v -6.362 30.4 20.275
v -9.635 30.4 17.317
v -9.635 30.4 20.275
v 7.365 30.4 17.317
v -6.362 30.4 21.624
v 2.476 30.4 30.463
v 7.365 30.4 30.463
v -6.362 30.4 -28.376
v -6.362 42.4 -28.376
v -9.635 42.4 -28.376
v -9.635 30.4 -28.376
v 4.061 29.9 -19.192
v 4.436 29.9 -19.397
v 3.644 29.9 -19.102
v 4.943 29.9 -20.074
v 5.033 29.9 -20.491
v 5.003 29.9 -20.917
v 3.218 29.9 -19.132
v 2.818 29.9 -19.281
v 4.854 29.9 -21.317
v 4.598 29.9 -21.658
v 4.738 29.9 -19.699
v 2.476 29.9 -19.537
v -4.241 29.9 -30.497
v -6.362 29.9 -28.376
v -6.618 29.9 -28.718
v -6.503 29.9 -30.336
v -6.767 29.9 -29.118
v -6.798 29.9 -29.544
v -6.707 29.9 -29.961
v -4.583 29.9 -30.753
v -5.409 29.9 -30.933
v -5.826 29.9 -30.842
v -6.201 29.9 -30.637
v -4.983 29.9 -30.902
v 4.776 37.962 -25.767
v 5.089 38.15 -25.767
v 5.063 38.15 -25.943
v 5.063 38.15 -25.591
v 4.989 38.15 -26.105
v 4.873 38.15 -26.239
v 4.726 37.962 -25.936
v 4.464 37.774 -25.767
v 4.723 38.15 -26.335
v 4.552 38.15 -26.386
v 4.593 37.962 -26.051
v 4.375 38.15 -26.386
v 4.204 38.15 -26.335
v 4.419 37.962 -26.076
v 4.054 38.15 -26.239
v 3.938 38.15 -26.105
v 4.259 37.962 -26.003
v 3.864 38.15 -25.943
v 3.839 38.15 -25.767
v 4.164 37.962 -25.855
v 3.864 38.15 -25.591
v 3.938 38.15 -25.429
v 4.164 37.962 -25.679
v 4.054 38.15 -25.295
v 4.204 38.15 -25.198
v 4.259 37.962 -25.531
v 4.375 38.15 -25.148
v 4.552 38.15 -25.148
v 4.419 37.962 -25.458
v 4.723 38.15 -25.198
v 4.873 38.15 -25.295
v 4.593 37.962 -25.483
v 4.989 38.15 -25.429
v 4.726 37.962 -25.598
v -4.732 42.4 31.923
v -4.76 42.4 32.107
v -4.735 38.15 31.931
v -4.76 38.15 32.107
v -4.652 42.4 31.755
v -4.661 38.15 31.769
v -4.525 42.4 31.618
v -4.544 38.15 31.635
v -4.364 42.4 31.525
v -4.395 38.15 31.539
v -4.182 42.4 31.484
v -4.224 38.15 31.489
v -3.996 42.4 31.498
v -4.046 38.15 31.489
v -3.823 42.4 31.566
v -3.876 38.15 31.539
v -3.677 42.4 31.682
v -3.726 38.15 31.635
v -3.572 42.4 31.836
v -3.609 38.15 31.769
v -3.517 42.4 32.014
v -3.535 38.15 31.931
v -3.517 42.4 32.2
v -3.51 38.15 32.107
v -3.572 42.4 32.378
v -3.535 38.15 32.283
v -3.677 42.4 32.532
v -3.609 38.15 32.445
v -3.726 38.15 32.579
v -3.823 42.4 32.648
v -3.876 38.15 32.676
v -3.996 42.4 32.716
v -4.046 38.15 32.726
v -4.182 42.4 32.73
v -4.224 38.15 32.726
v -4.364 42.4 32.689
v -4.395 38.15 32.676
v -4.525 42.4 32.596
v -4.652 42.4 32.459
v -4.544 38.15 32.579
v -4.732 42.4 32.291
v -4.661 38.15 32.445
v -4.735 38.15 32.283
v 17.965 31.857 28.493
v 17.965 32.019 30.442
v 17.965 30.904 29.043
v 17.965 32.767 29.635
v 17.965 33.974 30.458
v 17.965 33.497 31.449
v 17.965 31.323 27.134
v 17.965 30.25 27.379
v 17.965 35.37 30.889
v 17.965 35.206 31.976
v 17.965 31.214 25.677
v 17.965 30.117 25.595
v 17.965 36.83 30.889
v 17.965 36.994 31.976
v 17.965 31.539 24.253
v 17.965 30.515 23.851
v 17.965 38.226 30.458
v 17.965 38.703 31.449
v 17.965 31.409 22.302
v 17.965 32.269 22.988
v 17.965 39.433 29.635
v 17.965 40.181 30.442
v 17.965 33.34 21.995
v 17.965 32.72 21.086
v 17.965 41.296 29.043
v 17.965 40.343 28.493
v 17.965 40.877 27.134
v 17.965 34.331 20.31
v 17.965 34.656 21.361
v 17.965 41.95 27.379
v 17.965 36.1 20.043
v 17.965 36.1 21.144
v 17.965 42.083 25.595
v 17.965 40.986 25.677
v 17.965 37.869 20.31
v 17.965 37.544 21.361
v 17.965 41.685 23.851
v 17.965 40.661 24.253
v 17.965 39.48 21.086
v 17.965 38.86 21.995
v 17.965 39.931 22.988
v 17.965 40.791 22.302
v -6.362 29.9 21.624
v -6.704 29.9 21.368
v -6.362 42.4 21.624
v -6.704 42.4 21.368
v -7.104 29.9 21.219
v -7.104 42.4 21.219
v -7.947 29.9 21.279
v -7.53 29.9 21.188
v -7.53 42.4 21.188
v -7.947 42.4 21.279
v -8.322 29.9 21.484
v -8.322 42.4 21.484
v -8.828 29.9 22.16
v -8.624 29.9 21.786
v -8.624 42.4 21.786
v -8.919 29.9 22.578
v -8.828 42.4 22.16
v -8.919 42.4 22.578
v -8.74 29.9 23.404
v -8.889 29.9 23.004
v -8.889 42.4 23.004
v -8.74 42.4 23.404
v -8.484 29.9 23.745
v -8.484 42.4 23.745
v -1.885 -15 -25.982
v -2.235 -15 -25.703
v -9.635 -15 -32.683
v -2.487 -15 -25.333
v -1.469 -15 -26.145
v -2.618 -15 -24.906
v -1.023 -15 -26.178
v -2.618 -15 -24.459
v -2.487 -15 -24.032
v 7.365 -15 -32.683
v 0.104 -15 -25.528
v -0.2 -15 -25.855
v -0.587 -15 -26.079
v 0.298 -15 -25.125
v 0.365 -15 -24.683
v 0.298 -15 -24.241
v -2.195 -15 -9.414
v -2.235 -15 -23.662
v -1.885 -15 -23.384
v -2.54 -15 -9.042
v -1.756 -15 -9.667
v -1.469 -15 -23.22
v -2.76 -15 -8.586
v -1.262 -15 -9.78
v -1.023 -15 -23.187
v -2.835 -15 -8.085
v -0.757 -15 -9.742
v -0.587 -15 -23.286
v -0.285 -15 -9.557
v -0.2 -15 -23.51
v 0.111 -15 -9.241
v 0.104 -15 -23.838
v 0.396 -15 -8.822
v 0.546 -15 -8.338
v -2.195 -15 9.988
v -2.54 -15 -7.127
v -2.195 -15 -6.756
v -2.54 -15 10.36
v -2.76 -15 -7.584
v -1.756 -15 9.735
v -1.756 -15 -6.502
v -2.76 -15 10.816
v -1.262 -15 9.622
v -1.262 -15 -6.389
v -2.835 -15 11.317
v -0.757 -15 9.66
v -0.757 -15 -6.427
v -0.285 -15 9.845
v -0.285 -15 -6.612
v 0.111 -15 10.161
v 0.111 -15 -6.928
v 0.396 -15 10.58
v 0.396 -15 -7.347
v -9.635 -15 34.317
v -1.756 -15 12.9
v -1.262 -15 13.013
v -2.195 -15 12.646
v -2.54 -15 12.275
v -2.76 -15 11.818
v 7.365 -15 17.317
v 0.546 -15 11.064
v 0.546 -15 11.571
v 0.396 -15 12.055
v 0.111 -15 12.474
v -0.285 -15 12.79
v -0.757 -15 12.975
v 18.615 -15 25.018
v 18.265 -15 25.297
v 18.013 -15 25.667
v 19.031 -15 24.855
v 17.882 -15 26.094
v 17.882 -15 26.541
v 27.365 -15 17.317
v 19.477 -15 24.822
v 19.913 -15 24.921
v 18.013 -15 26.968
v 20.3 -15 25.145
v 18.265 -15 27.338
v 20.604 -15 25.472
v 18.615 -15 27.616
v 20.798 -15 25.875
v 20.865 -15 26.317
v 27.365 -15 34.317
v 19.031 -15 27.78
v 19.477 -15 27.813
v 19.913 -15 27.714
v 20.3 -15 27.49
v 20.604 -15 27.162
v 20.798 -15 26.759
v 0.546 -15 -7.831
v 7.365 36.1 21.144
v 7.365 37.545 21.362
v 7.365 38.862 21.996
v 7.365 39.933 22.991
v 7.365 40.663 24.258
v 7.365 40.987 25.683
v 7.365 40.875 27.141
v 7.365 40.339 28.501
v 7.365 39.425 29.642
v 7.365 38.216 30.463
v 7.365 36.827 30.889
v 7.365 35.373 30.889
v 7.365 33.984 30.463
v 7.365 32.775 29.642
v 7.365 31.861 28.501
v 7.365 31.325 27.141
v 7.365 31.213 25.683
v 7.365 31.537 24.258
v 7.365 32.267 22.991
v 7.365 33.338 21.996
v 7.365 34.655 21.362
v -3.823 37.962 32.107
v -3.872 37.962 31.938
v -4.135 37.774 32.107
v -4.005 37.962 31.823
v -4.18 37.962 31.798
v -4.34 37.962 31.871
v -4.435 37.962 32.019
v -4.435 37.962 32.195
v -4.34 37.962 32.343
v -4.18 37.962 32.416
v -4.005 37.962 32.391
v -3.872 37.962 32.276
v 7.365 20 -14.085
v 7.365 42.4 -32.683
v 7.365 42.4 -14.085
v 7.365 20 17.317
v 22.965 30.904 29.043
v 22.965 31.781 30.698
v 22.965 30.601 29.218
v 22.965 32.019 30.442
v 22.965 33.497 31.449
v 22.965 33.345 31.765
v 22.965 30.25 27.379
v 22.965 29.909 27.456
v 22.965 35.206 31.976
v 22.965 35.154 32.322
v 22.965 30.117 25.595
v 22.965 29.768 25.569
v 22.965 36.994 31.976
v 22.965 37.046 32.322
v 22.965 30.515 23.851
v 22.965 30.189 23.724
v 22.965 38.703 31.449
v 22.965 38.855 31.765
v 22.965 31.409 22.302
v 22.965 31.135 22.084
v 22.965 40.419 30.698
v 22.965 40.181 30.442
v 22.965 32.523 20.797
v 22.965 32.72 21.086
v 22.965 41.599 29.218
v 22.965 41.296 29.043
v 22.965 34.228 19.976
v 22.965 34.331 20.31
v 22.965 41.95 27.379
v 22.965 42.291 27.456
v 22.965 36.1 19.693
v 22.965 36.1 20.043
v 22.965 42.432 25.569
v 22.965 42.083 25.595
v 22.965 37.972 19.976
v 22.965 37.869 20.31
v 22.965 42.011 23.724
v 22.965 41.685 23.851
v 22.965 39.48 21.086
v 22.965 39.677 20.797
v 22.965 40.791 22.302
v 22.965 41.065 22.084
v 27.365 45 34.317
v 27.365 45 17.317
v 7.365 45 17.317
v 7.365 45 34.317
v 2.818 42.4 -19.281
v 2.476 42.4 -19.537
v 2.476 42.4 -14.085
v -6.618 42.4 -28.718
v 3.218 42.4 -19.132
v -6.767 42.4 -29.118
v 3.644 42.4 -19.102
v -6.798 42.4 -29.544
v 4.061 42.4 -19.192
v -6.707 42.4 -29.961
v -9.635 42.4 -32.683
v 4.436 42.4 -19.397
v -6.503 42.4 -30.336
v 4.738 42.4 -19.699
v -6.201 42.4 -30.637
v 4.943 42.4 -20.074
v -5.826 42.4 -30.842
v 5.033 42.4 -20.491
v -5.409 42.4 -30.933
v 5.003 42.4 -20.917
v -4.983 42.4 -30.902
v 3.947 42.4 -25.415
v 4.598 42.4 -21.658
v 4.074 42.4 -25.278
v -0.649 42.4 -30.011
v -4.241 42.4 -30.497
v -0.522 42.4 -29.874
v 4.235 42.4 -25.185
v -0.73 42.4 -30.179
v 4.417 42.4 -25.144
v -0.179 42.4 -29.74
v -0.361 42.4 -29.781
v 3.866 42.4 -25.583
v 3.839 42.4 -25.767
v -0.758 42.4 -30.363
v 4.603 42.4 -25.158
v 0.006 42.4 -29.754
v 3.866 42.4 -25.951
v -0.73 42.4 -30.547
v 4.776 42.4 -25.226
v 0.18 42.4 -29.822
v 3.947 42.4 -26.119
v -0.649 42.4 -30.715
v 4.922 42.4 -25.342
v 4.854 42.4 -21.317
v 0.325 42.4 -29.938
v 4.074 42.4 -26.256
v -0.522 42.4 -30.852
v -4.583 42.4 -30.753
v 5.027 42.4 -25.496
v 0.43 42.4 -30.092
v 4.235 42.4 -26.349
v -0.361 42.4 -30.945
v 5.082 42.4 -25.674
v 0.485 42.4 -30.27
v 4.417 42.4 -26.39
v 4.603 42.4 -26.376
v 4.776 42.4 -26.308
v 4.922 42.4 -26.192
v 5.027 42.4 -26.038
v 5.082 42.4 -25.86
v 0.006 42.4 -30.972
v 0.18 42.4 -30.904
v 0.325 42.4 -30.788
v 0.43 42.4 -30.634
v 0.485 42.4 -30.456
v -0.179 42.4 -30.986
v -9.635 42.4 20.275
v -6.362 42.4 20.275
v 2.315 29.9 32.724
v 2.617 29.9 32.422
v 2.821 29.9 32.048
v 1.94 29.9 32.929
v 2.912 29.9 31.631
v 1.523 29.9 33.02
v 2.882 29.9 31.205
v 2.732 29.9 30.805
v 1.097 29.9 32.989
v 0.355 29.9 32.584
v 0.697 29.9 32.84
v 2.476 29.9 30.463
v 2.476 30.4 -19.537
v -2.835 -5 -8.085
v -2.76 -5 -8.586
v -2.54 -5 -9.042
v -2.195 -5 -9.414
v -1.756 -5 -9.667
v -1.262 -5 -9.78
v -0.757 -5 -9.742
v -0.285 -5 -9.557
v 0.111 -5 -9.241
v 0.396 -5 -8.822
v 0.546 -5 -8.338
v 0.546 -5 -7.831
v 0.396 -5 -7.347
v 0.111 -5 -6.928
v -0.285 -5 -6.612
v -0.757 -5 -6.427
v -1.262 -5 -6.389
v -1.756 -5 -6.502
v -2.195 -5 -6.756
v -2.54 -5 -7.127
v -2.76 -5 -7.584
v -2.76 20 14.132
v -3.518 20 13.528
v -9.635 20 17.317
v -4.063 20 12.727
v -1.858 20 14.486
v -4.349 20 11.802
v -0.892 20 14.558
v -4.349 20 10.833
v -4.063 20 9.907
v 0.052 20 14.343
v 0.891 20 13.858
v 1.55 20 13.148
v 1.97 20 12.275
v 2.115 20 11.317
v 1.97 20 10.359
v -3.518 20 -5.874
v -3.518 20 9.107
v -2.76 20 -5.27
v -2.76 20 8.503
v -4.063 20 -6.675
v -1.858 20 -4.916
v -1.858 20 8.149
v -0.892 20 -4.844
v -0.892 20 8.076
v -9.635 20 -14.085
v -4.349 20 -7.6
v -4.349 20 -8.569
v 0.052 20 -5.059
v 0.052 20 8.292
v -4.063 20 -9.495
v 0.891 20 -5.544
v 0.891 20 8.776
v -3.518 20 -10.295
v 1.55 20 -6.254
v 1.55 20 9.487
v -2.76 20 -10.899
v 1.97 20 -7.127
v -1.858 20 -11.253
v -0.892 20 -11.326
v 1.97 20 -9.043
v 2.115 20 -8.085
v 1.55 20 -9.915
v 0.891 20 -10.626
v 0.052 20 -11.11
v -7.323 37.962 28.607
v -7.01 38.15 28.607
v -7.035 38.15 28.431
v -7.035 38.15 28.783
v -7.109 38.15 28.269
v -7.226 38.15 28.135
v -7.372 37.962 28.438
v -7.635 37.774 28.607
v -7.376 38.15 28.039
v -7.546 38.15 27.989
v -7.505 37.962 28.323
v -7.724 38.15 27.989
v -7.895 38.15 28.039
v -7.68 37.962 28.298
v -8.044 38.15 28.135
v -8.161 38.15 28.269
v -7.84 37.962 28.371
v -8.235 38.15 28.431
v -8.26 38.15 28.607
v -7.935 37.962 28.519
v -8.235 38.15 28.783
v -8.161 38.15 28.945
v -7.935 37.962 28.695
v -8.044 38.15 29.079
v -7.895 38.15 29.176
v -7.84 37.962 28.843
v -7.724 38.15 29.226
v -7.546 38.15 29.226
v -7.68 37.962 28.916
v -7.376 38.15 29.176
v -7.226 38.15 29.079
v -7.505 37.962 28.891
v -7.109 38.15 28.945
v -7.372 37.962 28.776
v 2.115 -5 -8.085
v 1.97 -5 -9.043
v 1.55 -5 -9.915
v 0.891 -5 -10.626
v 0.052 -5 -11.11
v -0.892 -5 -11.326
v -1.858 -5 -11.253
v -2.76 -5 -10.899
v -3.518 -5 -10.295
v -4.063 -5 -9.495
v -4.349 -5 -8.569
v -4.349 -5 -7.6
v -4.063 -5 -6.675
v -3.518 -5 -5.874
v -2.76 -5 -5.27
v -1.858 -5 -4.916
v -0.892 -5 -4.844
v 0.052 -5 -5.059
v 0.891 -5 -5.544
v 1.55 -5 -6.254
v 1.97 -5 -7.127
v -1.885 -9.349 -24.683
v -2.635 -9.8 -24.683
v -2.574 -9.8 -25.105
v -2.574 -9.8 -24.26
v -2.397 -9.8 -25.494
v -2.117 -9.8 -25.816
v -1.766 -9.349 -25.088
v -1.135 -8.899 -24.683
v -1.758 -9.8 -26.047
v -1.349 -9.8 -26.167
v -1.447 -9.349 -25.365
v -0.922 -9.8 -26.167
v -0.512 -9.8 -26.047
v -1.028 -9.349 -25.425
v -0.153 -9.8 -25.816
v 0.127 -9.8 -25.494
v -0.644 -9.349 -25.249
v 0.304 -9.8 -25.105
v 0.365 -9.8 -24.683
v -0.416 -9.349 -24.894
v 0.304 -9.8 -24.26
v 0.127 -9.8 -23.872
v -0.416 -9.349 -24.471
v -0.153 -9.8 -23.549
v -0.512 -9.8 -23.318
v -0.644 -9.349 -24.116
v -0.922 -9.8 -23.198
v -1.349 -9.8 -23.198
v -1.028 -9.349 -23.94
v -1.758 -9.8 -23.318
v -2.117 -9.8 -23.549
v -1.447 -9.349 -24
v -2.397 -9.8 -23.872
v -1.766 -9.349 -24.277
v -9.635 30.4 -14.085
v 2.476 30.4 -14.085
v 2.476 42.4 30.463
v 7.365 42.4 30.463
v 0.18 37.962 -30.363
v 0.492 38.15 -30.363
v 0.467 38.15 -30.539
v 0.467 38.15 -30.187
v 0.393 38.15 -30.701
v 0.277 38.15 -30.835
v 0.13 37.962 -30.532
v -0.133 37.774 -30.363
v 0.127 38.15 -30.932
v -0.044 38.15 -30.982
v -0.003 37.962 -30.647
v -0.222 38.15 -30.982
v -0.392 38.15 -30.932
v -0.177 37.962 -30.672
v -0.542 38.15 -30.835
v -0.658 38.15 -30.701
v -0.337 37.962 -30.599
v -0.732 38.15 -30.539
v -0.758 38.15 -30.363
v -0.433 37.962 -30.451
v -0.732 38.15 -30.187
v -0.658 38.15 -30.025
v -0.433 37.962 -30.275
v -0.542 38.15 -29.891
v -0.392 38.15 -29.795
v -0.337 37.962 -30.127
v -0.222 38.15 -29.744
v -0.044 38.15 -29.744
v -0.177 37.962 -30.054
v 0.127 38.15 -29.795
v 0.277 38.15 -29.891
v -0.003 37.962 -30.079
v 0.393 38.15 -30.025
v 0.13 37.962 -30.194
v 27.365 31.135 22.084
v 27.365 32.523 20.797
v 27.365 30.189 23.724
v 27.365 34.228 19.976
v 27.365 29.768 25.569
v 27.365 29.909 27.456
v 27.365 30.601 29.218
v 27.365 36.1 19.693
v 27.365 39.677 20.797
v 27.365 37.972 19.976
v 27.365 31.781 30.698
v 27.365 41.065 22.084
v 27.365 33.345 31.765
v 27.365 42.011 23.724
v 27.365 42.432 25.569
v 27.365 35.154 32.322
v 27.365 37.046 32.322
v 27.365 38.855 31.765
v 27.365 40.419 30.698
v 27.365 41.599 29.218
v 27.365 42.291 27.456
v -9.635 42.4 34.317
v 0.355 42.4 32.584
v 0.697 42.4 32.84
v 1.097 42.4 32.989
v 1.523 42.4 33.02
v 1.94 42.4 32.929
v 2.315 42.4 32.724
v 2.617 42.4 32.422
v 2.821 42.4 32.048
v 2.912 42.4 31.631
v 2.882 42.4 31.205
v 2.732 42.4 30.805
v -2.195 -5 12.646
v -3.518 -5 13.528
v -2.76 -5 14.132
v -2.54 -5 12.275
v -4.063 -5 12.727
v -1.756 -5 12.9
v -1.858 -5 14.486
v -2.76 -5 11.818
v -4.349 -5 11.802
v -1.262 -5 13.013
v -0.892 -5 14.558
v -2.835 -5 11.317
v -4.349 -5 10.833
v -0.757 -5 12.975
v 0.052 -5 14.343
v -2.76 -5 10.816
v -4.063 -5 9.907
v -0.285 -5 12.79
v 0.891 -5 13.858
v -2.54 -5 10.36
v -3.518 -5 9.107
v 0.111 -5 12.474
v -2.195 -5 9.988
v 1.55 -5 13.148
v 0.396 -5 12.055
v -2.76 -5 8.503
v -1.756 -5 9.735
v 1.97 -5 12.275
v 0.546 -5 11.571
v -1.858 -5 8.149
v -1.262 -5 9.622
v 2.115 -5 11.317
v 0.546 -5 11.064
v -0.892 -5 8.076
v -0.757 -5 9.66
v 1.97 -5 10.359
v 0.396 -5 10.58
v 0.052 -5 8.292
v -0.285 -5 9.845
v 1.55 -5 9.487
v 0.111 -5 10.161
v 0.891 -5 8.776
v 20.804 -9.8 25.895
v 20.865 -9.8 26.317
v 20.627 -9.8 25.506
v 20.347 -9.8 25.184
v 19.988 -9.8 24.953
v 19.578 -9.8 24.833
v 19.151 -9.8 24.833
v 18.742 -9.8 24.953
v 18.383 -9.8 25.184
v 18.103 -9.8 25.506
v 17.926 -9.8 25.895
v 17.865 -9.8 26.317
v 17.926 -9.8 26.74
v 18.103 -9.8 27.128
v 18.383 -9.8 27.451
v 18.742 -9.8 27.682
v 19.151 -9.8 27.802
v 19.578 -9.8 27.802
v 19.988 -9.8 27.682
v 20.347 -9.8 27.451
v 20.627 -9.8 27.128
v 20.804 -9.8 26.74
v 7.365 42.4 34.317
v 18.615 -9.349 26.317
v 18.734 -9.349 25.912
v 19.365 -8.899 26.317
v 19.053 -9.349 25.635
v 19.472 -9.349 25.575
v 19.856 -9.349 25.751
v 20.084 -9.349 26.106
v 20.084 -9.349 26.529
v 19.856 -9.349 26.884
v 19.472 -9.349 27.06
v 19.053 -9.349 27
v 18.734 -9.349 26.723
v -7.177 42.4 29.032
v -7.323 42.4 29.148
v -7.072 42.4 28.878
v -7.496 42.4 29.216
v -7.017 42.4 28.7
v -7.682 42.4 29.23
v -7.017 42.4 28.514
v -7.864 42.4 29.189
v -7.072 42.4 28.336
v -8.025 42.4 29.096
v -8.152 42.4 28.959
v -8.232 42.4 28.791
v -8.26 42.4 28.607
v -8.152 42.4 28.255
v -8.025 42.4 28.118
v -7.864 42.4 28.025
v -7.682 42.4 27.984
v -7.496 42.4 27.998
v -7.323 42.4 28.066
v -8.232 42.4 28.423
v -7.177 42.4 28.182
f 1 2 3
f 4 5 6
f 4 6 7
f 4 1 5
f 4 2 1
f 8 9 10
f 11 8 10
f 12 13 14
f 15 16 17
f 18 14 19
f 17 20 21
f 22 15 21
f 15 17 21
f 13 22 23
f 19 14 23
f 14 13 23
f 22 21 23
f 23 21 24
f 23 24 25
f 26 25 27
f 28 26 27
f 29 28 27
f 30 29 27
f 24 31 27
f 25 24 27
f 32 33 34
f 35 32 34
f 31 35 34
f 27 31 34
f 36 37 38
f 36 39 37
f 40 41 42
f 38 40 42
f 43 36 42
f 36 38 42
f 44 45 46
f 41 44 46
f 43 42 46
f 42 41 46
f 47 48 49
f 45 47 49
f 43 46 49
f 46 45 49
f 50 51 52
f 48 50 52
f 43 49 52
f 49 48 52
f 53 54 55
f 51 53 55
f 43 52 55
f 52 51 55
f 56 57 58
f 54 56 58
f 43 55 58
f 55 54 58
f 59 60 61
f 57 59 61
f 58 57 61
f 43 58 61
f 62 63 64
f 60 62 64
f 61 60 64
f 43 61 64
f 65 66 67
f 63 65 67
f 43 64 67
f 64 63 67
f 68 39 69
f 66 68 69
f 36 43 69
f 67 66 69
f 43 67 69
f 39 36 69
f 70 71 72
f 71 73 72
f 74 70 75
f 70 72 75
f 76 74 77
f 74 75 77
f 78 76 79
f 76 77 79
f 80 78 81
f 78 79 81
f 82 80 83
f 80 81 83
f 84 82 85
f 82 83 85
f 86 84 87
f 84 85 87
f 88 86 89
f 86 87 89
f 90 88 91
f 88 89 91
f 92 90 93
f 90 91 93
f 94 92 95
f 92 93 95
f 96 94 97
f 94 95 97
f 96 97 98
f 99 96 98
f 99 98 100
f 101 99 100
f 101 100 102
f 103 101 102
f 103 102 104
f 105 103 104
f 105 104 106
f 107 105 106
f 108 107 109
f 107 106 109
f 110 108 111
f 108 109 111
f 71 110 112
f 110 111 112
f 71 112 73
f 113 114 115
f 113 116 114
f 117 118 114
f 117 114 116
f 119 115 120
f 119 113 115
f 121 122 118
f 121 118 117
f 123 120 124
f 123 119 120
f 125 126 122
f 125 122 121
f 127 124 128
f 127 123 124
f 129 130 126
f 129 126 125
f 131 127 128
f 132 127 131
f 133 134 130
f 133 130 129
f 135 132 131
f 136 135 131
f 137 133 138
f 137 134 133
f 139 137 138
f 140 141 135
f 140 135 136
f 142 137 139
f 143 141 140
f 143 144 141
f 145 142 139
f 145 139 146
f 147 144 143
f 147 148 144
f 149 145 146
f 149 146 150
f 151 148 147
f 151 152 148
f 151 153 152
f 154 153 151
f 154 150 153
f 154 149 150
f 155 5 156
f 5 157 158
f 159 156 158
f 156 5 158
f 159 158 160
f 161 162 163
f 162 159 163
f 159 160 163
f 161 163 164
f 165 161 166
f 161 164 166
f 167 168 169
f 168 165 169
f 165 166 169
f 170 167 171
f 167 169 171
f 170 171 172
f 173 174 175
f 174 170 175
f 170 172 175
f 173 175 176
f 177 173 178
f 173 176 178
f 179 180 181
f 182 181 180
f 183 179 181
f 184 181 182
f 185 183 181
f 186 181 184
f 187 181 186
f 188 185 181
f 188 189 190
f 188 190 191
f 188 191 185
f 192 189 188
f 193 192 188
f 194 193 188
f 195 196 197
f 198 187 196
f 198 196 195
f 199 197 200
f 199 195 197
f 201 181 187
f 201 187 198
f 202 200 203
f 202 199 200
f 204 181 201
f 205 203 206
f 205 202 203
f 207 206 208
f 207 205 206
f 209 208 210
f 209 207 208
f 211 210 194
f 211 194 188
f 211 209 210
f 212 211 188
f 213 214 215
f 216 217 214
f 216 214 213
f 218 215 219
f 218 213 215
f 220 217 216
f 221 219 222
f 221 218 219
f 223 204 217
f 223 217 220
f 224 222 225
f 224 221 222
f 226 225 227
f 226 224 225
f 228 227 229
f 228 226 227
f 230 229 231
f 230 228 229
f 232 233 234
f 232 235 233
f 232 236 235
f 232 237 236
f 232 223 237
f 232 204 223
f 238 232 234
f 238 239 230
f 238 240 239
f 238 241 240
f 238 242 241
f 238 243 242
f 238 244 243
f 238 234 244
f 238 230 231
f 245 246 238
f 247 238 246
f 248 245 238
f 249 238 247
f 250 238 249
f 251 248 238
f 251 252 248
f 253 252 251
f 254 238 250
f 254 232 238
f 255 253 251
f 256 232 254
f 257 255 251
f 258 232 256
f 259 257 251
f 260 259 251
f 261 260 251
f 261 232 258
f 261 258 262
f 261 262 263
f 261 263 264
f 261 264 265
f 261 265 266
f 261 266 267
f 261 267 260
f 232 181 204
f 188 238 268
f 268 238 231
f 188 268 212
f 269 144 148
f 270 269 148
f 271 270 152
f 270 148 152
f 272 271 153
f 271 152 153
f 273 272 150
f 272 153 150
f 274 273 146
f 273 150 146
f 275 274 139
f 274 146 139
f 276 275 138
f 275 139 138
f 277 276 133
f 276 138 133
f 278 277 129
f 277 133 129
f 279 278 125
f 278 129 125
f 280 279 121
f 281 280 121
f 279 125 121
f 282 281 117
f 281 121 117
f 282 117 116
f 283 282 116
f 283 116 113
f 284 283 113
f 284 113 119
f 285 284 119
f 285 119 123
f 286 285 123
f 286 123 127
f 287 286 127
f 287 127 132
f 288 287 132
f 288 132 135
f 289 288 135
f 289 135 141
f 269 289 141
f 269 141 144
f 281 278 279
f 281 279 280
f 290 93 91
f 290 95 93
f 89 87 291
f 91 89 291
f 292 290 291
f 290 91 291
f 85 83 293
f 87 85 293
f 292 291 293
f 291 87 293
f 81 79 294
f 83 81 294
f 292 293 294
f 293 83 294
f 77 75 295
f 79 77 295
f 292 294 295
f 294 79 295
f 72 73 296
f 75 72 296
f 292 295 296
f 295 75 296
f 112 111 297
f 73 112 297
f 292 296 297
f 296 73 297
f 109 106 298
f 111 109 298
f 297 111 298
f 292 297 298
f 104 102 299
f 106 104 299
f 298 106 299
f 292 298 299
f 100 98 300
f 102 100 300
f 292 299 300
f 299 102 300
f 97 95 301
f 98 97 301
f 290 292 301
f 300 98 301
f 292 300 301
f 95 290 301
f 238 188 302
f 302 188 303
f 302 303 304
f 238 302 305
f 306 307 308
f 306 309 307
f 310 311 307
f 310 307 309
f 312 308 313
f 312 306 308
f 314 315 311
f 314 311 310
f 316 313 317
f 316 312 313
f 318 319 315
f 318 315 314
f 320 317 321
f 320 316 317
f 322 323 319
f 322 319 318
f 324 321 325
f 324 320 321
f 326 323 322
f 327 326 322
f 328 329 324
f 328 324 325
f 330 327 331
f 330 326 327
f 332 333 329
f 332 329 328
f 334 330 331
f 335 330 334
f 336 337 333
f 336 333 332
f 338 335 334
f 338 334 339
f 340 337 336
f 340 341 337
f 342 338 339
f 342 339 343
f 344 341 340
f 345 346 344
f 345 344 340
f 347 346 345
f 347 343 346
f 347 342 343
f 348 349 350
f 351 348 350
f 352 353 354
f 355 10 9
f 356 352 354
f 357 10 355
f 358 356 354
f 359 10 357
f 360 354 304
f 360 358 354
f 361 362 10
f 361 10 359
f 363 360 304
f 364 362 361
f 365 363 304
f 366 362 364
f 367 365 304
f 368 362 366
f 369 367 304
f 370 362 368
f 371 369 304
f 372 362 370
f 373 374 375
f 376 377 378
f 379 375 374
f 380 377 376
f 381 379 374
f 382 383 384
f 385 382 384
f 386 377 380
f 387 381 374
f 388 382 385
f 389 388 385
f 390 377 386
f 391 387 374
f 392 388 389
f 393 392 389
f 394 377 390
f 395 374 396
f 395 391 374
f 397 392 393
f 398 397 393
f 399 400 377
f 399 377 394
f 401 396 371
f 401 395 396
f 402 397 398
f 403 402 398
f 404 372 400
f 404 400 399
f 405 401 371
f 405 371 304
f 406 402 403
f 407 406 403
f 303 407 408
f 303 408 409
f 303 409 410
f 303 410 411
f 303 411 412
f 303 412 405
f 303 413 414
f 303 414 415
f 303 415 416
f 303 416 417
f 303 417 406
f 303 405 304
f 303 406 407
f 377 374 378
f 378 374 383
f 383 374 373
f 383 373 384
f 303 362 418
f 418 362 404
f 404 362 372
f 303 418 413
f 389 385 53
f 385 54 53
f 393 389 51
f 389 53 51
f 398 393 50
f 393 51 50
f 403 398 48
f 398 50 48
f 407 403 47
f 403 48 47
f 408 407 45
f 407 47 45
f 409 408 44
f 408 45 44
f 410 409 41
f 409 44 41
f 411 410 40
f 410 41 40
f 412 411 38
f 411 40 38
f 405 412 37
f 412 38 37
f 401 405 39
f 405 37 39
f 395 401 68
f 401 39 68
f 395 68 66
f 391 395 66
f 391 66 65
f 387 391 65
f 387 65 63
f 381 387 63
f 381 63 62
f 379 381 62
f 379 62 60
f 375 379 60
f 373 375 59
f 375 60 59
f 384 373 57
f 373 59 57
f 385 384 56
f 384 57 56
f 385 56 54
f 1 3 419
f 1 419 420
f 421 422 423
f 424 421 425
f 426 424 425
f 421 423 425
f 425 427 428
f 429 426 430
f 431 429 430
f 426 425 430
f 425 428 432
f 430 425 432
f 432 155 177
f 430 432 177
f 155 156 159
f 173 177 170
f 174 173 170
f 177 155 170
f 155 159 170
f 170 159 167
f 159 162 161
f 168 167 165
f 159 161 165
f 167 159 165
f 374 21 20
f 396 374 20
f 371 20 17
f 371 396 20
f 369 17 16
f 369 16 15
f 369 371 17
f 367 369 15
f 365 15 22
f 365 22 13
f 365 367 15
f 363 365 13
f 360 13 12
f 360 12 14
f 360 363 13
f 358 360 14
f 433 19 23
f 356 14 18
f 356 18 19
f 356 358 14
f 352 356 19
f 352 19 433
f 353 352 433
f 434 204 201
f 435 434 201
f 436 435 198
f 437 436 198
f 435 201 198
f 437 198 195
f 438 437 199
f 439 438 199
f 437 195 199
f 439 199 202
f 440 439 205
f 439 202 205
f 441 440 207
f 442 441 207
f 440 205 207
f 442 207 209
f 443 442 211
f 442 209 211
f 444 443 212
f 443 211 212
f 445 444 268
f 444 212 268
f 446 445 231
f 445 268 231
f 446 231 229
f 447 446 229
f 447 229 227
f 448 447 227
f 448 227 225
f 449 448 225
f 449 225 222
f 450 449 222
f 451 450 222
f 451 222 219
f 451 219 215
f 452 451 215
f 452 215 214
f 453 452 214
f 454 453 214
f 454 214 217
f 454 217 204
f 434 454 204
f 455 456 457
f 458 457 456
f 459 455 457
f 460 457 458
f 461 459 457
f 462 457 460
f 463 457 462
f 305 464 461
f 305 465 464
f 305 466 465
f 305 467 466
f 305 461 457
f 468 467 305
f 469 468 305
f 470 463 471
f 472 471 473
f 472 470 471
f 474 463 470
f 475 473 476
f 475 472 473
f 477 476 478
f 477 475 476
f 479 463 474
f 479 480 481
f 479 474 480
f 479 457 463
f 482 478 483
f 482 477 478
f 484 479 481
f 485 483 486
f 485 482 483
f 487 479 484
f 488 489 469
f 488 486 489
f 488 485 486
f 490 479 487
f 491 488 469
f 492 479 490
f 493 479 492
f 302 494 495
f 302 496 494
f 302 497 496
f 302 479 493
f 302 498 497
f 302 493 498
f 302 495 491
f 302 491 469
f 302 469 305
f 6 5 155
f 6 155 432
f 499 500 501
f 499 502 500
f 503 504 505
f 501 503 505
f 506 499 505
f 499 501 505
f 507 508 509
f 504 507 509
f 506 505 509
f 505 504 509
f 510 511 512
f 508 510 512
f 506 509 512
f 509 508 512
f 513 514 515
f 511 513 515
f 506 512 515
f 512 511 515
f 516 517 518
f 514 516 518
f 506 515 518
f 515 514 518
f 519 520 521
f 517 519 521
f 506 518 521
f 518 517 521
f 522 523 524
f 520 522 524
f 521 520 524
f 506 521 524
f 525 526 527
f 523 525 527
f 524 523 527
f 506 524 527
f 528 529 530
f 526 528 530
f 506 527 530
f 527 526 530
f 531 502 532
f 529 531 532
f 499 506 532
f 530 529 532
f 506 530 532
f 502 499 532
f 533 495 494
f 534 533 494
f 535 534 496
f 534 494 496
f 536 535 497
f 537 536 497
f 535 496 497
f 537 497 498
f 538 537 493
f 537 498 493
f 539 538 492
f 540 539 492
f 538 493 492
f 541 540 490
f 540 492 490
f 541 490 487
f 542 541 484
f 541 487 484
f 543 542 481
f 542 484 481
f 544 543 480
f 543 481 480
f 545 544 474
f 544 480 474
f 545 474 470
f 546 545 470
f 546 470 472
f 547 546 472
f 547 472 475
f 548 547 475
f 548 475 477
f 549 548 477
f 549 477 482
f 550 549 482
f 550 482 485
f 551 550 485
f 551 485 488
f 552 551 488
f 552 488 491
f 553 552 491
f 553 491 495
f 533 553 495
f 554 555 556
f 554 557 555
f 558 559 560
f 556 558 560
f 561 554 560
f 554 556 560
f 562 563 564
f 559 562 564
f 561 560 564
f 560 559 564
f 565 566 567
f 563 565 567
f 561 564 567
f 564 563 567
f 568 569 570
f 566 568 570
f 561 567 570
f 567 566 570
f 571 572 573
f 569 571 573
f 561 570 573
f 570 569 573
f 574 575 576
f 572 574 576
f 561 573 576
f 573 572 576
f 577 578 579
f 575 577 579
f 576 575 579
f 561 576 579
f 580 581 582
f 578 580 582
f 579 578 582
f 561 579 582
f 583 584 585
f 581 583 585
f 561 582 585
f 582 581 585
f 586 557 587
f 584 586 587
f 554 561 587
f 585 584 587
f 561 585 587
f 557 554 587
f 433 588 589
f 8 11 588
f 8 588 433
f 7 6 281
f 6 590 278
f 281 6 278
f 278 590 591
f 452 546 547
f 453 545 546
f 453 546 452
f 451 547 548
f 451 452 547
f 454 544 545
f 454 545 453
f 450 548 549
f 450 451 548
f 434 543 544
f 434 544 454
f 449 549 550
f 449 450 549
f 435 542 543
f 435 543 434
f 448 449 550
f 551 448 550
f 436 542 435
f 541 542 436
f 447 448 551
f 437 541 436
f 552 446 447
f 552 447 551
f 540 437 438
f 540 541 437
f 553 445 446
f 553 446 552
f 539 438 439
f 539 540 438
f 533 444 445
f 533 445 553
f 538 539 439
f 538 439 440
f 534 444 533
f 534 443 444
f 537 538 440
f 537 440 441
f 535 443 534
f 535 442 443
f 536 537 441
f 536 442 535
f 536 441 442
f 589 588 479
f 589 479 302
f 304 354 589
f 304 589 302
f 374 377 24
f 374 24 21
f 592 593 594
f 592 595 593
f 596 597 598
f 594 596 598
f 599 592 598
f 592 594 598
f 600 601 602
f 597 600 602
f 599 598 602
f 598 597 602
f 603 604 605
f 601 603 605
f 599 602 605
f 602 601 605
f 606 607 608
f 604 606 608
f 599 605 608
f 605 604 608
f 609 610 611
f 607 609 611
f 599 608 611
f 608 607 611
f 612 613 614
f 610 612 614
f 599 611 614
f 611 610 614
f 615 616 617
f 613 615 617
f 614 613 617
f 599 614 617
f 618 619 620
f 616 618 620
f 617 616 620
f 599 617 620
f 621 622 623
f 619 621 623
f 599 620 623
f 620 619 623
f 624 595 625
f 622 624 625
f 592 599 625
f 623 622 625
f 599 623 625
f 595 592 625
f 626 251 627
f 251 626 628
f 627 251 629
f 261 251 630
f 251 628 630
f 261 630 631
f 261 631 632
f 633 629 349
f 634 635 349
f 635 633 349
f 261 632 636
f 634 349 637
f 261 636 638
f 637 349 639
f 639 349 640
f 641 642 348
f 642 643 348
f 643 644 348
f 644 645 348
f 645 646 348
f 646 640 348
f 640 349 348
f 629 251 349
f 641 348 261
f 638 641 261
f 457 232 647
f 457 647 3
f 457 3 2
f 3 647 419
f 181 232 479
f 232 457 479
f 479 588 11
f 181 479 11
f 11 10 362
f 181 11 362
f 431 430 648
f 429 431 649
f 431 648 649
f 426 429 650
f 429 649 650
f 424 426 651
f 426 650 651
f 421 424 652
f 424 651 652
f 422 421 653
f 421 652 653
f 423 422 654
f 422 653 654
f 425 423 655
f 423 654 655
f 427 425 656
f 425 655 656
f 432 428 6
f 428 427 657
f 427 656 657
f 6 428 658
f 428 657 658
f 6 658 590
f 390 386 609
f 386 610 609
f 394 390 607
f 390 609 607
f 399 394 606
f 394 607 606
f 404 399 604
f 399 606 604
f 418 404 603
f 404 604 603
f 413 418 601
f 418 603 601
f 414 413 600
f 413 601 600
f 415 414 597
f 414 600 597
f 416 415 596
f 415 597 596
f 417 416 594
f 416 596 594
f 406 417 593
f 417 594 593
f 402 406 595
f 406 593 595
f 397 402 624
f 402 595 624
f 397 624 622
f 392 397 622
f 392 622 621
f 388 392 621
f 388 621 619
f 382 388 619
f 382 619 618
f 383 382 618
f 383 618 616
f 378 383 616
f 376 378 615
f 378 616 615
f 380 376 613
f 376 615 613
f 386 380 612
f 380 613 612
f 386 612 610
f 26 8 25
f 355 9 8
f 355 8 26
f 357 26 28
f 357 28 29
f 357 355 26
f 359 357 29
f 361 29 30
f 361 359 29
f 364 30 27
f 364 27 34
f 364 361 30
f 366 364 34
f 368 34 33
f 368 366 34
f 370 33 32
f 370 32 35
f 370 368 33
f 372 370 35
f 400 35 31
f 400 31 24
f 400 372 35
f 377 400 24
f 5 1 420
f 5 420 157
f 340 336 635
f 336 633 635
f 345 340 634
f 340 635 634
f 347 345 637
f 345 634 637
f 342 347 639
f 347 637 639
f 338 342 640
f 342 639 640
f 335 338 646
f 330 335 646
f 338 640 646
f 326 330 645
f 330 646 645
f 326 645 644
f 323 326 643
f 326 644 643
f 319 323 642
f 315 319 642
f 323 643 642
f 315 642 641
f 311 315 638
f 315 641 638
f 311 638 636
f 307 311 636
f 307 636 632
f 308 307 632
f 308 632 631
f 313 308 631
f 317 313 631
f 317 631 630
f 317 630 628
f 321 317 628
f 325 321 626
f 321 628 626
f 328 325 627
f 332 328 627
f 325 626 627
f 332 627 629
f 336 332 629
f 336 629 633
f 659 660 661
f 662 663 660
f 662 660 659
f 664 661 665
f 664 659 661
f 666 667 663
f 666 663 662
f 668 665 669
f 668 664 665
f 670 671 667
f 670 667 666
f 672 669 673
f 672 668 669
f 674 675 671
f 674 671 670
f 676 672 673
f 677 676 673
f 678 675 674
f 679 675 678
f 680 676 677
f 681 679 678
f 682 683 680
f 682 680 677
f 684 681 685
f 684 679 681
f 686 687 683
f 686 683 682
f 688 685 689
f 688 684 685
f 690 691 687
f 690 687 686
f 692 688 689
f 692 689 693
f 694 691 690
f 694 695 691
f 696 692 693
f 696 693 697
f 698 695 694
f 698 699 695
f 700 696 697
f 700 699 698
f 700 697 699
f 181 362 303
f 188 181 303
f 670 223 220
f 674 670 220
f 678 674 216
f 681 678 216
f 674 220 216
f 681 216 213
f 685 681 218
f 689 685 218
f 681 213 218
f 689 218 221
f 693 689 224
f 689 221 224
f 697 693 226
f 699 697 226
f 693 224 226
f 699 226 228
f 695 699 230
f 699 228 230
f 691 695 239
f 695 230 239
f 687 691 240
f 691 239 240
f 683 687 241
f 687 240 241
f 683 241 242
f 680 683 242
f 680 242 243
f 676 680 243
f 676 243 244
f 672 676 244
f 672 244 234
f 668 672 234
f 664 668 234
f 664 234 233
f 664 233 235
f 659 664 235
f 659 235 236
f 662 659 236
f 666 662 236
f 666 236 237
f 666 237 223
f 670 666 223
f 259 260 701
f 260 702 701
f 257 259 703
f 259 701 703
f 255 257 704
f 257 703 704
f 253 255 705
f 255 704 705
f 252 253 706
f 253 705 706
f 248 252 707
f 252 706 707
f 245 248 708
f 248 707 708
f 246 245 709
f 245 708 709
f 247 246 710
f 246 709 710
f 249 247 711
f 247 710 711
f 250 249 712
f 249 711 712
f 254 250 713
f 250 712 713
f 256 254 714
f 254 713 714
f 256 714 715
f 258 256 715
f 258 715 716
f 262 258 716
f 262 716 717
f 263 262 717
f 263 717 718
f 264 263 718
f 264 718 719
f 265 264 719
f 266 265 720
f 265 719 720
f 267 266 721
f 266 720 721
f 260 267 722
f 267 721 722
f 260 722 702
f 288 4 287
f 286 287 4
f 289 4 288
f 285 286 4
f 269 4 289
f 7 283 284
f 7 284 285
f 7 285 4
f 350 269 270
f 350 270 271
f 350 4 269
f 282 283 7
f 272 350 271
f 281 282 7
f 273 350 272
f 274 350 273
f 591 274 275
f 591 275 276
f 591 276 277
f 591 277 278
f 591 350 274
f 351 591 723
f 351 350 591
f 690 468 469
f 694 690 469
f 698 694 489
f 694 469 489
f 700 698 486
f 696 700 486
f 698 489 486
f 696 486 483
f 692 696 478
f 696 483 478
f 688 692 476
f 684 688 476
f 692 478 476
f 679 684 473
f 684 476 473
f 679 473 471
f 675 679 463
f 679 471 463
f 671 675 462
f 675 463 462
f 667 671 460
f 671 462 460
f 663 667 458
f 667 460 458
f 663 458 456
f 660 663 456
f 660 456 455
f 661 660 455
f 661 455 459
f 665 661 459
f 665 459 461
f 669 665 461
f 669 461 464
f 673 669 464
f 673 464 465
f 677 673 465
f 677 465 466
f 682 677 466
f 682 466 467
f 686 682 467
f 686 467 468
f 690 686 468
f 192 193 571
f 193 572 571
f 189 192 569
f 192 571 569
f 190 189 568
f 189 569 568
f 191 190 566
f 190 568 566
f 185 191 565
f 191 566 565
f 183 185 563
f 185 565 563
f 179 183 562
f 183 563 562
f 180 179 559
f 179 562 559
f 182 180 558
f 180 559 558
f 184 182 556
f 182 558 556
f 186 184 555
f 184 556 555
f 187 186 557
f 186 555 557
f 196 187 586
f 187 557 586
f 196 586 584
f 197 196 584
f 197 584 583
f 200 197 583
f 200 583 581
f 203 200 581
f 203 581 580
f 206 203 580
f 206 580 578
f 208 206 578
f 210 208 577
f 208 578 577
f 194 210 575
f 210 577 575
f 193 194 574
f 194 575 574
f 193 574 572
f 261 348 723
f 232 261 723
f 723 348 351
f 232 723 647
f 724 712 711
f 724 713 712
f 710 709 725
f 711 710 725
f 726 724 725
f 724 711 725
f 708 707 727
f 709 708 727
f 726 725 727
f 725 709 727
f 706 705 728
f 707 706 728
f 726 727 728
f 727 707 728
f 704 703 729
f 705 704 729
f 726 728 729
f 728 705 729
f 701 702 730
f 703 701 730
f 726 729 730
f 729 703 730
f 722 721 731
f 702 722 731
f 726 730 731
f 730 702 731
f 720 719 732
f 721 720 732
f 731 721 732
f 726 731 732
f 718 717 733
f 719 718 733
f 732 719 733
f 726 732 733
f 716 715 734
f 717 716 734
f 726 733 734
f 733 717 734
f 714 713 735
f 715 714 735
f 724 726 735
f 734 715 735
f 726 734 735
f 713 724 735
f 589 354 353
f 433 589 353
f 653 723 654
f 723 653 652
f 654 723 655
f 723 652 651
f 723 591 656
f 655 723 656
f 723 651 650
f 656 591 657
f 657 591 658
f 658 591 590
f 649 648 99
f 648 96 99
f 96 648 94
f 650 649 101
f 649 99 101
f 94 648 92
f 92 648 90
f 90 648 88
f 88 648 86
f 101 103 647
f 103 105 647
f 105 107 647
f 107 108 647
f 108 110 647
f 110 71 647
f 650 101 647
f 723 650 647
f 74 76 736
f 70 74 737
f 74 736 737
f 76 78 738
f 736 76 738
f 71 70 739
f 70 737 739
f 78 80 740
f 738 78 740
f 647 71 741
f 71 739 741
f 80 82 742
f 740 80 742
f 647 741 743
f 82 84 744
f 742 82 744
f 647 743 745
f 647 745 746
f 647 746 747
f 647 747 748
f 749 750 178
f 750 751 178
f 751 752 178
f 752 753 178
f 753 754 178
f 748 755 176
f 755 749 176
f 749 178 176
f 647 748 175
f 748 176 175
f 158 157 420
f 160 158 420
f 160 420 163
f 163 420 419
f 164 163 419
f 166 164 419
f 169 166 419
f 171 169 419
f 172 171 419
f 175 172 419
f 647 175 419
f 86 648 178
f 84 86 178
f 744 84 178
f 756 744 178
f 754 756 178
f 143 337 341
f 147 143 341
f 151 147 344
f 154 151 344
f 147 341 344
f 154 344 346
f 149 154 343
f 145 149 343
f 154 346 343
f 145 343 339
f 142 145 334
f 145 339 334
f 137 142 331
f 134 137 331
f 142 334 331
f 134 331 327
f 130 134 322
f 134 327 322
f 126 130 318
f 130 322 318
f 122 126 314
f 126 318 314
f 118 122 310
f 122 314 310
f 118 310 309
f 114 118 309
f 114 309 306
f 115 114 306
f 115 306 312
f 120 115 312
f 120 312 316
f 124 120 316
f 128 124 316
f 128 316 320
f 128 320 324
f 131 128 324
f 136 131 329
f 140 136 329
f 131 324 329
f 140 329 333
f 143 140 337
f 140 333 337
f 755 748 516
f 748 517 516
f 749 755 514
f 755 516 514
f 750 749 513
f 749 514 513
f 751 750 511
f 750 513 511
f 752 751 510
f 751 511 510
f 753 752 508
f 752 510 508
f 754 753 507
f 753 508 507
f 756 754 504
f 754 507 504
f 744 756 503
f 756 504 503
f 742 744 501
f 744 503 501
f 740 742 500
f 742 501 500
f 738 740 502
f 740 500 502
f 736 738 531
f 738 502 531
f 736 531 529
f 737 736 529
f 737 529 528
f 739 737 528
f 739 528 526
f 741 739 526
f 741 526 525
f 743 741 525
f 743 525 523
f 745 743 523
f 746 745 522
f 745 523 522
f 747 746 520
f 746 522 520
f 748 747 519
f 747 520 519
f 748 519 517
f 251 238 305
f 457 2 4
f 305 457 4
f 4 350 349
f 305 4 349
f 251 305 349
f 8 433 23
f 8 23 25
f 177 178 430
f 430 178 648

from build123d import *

# Parameters (mm, degrees)
BOSS_EXTRUDE1_DEPTH            = 45
SKETCH2_W                      = 17
SKETCH2_H                      = 31.401973819
CUT_EXTRUDE1_DEPTH             = 25
BOSS_EXTRUDE2_DEPTH            = 15
SKETCH5_W                      = 17
SKETCH5_H                      = 18.598026181
CUT_EXTRUDE2_DEPTH             = 2.6
CUT_EXTRUDE3_DEPTH             = 12
CUT_EXTRUDE4_DEPTH             = 14.6
SKETCH4_R                      = 6.35
CUT_EXTRUDE6_DEPTH             = 4.4
SKETCH11_R                     = 6
CUT_EXTRUDE7_DEPTH             = 5
SM05_TAPPED_HOLE1_D            = 12.7
SM05_TAPPED_HOLE1_DEPTH        = 3
SM05_TAPPED_HOLE1_TIP          = 3.815464931
CUT_EXTRUDE9_DEPTH             = 12.5
CUT_EXTRUDE10_DEPTH            = 0.5
CUT_EXTRUDE11_DEPTH            = 2.6
SKETCH18_R                     = 4.89982915
CUT_EXTRUDE12_DEPTH            = 10.6
CBORE_FOR_M3_SHCS1_D           = 3.4
CBORE_FOR_M3_SHCS1_DEPTH       = 35
CBORE_FOR_M3_SHCS1_CBORE_D     = 6.5
CBORE_FOR_M3_SHCS1_CBORE_DEPTH = 25
F_3_0MM_DOWEL_HOLE1_D          = 3
F_3_0MM_DOWEL_HOLE1_DEPTH      = 5.2
F_3_0MM_DOWEL_HOLE1_TIP        = 0.901290929
M1_6_TAPPED_HOLE1_D            = 1.25
M1_6_TAPPED_HOLE1_DEPTH        = 4.25
M1_6_TAPPED_HOLE1_TIP          = 0.375537887
M1_6_TAPPED_HOLE2_D            = 1.25
M1_6_TAPPED_HOLE2_DEPTH        = 4.25
M1_6_TAPPED_HOLE2_TIP          = 0.375537887


with BuildPart() as part:
    # Sketch1 → Boss-Extrude1 (new body)
    with BuildSketch(Plane(origin=(0, 0, 0), x_dir=(1, 0, 0), z_dir=(0, 1, 0))):
        Polygon((27.364828995, -34.317342946), (-9.635171005, -34.317342946), (-9.635171005, 32.682657054), (7.364828995, 32.682657054), (7.364828995, -17.317342946), (27.364828995, -17.317342946), align=None)
    extrude(amount=BOSS_EXTRUDE1_DEPTH)

    # Sketch2 → Cut-Extrude1 (cut)
    with BuildSketch(Plane(origin=(0, 45, 0), x_dir=(1, 0, 0), z_dir=(0, 1, 0))):
        with Locations((-1.135171005, -1.616356037)):
            Rectangle(SKETCH2_W, SKETCH2_H)
    extrude(amount=-CUT_EXTRUDE1_DEPTH, mode=Mode.SUBTRACT)

    # Sketch3 → Boss-Extrude2 (add)
    with BuildSketch(Plane.XZ):
        Polygon((27.364828995, 34.317342946), (-9.635171005, 34.317342946), (-9.635171005, -32.682657054), (7.364828995, -32.682657054), (7.364828995, 17.317342946), (27.364828995, 17.317342946), align=None)
    extrude(amount=BOSS_EXTRUDE2_DEPTH)

    # Sketch5 → Cut-Extrude2 (cut)
    with BuildSketch(Plane(origin=(0, 45, 0), x_dir=(1, 0, 0), z_dir=(0, 1, 0))):
        with Locations((-1.135171005, 23.383643964)):
            Rectangle(SKETCH5_W, SKETCH5_H)
    extrude(amount=-CUT_EXTRUDE2_DEPTH, mode=Mode.SUBTRACT)

    # Sketch6 → Cut-Extrude3 (cut)
    with BuildSketch(Plane(origin=(0, 42.4, 0), x_dir=(1, 0, 0), z_dir=(0, 1, 0))):
        Polygon((-9.635171005, 28.375993351), (-9.635171005, 14.084630873), (2.47645738, 14.084630873), (2.47645738, 19.537158586), (-6.362377384, 28.375993351), align=None)
    extrude(amount=-CUT_EXTRUDE3_DEPTH, mode=Mode.SUBTRACT)

    # Sketch7 → Cut-Extrude4 (cut)
    with BuildSketch(Plane(origin=(0, 45, 0), x_dir=(1, 0, 0), z_dir=(0, 1, 0))):
        with BuildLine():
            Line((2.47645738, -30.462841414), (7.364828995, -30.462841414))
            Line((7.364828995, -30.462841414), (7.364828995, -17.317342946))
            Line((7.364828995, -17.317342946), (-9.635171005, -17.317342946))
            Line((-9.635171005, -17.317342946), (-9.635171005, -20.274833742))
            Line((-9.635171005, -20.274833742), (-6.362377384, -20.274833742))
            Line((-6.362377384, -20.274833742), (-6.362377384, -21.624006649))
            ThreePointArc((-6.362377384, -21.624006649), (-8.483697728, -21.624006649), (-8.483697728, -23.745326993))
            Line((-8.483697728, -23.745326993), (0.355137037, -32.584161758))
            ThreePointArc((0.355137037, -32.584161758), (2.47645738, -32.584161758), (2.47645738, -30.462841414))
        make_face()
    extrude(amount=-CUT_EXTRUDE4_DEPTH, mode=Mode.SUBTRACT)

    # Sketch4 → Cut-Extrude6 (cut)
    with BuildSketch(Plane(origin=(27.364828995, 0, 0), x_dir=(0, 0, -1), z_dir=(1, 0, 0))):
        with Locations((-26.043424032, 36.1)):
            Circle(SKETCH4_R)
    extrude(amount=-CUT_EXTRUDE6_DEPTH, mode=Mode.SUBTRACT)

    # Sketch11 → Cut-Extrude7 (cut)
    with BuildSketch(Plane(origin=(22.964828995, 0, 0), x_dir=(0, 0, -1), z_dir=(1, 0, 0))):
        with Locations((-26.043424032, 36.1)):
            Circle(SKETCH11_R)
    extrude(amount=-CUT_EXTRUDE7_DEPTH, mode=Mode.SUBTRACT)

    # SM05 Tapped Hole1
    with Locations(Plane(origin=(27.364828995, 0, 0), x_dir=(0, 0, -1), z_dir=(1, 0, 0))):
        with Locations((-26.043424032, 36.1)):
            Hole(SM05_TAPPED_HOLE1_D / 2, depth=SM05_TAPPED_HOLE1_DEPTH)
            with Locations((0, 0, -(SM05_TAPPED_HOLE1_DEPTH + SM05_TAPPED_HOLE1_TIP / 2))):  # 118° drill point
                Cone(0, SM05_TAPPED_HOLE1_D / 2, SM05_TAPPED_HOLE1_TIP, mode=Mode.SUBTRACT)

    # Sketch15 → Cut-Extrude9 (cut)
    with BuildSketch(Plane(origin=(0, 42.4, 0), x_dir=(1, 0, 0), z_dir=(0, 1, 0))):
        with BuildLine():
            Line((-4.241057041, 30.497313694), (4.597777724, 21.658478929))
            ThreePointArc((4.597777724, 21.658478929), (4.597777724, 19.537158586), (2.47645738, 19.537158586))
            Line((2.47645738, 19.537158586), (-6.362377384, 28.375993351))
            ThreePointArc((-6.362377384, 28.375993351), (-6.362377384, 30.497313694), (-4.241057041, 30.497313694))
        make_face()
    extrude(amount=-CUT_EXTRUDE9_DEPTH, mode=Mode.SUBTRACT)

    # Sketch16 → Cut-Extrude10 (cut)
    with BuildSketch(Plane(origin=(0, 30.4, 0), x_dir=(1, 0, 0), z_dir=(0, 1, 0))):
        with BuildLine():
            Line((-6.362377384, -21.624006649), (2.47645738, -30.462841414))
            ThreePointArc((2.47645738, -30.462841414), (2.47645738, -32.584161758), (0.355137037, -32.584161758))
            Line((0.355137037, -32.584161758), (-8.483697728, -23.745326993))
            ThreePointArc((-8.483697728, -23.745326993), (-8.483697728, -21.624006649), (-6.362377384, -21.624006649))
        make_face()
    extrude(amount=-CUT_EXTRUDE10_DEPTH, mode=Mode.SUBTRACT)

    # Sketch17 → Cut-Extrude11 (cut)
    with BuildSketch(Plane(origin=(0, 45, 0), x_dir=(1, 0, 0), z_dir=(0, 1, 0))):
        with BuildLine():
            Line((7.364828995, -30.462841414), (7.364828995, -34.317342946))
            Line((7.364828995, -34.317342946), (-9.635171005, -34.317342946))
            Line((-9.635171005, -34.317342946), (-9.635171005, -20.274833742))
            Line((-9.635171005, -20.274833742), (-6.362377384, -20.274833742))
            Line((-6.362377384, -20.274833742), (-6.362377384, -21.624006649))
            ThreePointArc((-6.362377384, -21.624006649), (-8.483697728, -21.624006649), (-8.483697728, -23.745326993))
            Line((-8.483697728, -23.745326993), (0.355137037, -32.584161758))
            ThreePointArc((0.355137037, -32.584161758), (2.47645738, -32.584161758), (2.47645738, -30.462841414))
            Line((2.47645738, -30.462841414), (7.364828995, -30.462841414))
        make_face()
    extrude(amount=-CUT_EXTRUDE11_DEPTH, mode=Mode.SUBTRACT)

    # Sketch18 → Cut-Extrude12 (cut)
    with BuildSketch(Plane(origin=(17.964828995, 0, 0), x_dir=(0, 0, -1), z_dir=(1, 0, 0))):
        with Locations((-26.043424032, 36.1)):
            Circle(SKETCH18_R)
    extrude(amount=-CUT_EXTRUDE12_DEPTH, mode=Mode.SUBTRACT)

    # CBORE for M3 SHCS1
    with Locations(Plane(origin=(0, 20, 0), x_dir=(1, 0, 0), z_dir=(0, 1, 0))):
        with Locations((-1.135171005, 8.084630873), (-1.135171005, -11.317342946)):
            CounterBoreHole(CBORE_FOR_M3_SHCS1_D / 2, CBORE_FOR_M3_SHCS1_CBORE_D / 2, CBORE_FOR_M3_SHCS1_CBORE_DEPTH, depth=CBORE_FOR_M3_SHCS1_DEPTH)

    # Ø3.0mm Dowel Hole1
    with Locations(Plane(origin=(0, -15, 0), x_dir=(-1, 0, 0), z_dir=(0, -1, 0))):
        with Locations((-19.364828995, -26.317342946), (1.135171005, 24.682657054)):
            Hole(F_3_0MM_DOWEL_HOLE1_D / 2, depth=F_3_0MM_DOWEL_HOLE1_DEPTH)
            with Locations((0, 0, -(F_3_0MM_DOWEL_HOLE1_DEPTH + F_3_0MM_DOWEL_HOLE1_TIP / 2))):  # 118° drill point
                Cone(0, F_3_0MM_DOWEL_HOLE1_D / 2, F_3_0MM_DOWEL_HOLE1_TIP, mode=Mode.SUBTRACT)

    # M1.6 Tapped Hole1
    with Locations(Plane(origin=(0, 42.4, 0), x_dir=(1, 0, 0), z_dir=(0, 1, 0))):
        with Locations((-0.132659145, 30.363070903), (4.463534932, 25.766876825)):
            Hole(M1_6_TAPPED_HOLE1_D / 2, depth=M1_6_TAPPED_HOLE1_DEPTH)
            with Locations((0, 0, -(M1_6_TAPPED_HOLE1_DEPTH + M1_6_TAPPED_HOLE1_TIP / 2))):  # 118° drill point
                Cone(0, M1_6_TAPPED_HOLE1_D / 2, M1_6_TAPPED_HOLE1_TIP, mode=Mode.SUBTRACT)

    # M1.6 Tapped Hole2
    with Locations(Plane(origin=(0, 42.4, 0), x_dir=(1, 0, 0), z_dir=(0, 1, 0))):
        with Locations((-4.135171005, -32.107144182), (-7.635171005, -28.607144182)):
            Hole(M1_6_TAPPED_HOLE2_D / 2, depth=M1_6_TAPPED_HOLE2_DEPTH)
            with Locations((0, 0, -(M1_6_TAPPED_HOLE2_DEPTH + M1_6_TAPPED_HOLE2_TIP / 2))):  # 118° drill point
                Cone(0, M1_6_TAPPED_HOLE2_D / 2, M1_6_TAPPED_HOLE2_TIP, mode=Mode.SUBTRACT)


solid = part.part
